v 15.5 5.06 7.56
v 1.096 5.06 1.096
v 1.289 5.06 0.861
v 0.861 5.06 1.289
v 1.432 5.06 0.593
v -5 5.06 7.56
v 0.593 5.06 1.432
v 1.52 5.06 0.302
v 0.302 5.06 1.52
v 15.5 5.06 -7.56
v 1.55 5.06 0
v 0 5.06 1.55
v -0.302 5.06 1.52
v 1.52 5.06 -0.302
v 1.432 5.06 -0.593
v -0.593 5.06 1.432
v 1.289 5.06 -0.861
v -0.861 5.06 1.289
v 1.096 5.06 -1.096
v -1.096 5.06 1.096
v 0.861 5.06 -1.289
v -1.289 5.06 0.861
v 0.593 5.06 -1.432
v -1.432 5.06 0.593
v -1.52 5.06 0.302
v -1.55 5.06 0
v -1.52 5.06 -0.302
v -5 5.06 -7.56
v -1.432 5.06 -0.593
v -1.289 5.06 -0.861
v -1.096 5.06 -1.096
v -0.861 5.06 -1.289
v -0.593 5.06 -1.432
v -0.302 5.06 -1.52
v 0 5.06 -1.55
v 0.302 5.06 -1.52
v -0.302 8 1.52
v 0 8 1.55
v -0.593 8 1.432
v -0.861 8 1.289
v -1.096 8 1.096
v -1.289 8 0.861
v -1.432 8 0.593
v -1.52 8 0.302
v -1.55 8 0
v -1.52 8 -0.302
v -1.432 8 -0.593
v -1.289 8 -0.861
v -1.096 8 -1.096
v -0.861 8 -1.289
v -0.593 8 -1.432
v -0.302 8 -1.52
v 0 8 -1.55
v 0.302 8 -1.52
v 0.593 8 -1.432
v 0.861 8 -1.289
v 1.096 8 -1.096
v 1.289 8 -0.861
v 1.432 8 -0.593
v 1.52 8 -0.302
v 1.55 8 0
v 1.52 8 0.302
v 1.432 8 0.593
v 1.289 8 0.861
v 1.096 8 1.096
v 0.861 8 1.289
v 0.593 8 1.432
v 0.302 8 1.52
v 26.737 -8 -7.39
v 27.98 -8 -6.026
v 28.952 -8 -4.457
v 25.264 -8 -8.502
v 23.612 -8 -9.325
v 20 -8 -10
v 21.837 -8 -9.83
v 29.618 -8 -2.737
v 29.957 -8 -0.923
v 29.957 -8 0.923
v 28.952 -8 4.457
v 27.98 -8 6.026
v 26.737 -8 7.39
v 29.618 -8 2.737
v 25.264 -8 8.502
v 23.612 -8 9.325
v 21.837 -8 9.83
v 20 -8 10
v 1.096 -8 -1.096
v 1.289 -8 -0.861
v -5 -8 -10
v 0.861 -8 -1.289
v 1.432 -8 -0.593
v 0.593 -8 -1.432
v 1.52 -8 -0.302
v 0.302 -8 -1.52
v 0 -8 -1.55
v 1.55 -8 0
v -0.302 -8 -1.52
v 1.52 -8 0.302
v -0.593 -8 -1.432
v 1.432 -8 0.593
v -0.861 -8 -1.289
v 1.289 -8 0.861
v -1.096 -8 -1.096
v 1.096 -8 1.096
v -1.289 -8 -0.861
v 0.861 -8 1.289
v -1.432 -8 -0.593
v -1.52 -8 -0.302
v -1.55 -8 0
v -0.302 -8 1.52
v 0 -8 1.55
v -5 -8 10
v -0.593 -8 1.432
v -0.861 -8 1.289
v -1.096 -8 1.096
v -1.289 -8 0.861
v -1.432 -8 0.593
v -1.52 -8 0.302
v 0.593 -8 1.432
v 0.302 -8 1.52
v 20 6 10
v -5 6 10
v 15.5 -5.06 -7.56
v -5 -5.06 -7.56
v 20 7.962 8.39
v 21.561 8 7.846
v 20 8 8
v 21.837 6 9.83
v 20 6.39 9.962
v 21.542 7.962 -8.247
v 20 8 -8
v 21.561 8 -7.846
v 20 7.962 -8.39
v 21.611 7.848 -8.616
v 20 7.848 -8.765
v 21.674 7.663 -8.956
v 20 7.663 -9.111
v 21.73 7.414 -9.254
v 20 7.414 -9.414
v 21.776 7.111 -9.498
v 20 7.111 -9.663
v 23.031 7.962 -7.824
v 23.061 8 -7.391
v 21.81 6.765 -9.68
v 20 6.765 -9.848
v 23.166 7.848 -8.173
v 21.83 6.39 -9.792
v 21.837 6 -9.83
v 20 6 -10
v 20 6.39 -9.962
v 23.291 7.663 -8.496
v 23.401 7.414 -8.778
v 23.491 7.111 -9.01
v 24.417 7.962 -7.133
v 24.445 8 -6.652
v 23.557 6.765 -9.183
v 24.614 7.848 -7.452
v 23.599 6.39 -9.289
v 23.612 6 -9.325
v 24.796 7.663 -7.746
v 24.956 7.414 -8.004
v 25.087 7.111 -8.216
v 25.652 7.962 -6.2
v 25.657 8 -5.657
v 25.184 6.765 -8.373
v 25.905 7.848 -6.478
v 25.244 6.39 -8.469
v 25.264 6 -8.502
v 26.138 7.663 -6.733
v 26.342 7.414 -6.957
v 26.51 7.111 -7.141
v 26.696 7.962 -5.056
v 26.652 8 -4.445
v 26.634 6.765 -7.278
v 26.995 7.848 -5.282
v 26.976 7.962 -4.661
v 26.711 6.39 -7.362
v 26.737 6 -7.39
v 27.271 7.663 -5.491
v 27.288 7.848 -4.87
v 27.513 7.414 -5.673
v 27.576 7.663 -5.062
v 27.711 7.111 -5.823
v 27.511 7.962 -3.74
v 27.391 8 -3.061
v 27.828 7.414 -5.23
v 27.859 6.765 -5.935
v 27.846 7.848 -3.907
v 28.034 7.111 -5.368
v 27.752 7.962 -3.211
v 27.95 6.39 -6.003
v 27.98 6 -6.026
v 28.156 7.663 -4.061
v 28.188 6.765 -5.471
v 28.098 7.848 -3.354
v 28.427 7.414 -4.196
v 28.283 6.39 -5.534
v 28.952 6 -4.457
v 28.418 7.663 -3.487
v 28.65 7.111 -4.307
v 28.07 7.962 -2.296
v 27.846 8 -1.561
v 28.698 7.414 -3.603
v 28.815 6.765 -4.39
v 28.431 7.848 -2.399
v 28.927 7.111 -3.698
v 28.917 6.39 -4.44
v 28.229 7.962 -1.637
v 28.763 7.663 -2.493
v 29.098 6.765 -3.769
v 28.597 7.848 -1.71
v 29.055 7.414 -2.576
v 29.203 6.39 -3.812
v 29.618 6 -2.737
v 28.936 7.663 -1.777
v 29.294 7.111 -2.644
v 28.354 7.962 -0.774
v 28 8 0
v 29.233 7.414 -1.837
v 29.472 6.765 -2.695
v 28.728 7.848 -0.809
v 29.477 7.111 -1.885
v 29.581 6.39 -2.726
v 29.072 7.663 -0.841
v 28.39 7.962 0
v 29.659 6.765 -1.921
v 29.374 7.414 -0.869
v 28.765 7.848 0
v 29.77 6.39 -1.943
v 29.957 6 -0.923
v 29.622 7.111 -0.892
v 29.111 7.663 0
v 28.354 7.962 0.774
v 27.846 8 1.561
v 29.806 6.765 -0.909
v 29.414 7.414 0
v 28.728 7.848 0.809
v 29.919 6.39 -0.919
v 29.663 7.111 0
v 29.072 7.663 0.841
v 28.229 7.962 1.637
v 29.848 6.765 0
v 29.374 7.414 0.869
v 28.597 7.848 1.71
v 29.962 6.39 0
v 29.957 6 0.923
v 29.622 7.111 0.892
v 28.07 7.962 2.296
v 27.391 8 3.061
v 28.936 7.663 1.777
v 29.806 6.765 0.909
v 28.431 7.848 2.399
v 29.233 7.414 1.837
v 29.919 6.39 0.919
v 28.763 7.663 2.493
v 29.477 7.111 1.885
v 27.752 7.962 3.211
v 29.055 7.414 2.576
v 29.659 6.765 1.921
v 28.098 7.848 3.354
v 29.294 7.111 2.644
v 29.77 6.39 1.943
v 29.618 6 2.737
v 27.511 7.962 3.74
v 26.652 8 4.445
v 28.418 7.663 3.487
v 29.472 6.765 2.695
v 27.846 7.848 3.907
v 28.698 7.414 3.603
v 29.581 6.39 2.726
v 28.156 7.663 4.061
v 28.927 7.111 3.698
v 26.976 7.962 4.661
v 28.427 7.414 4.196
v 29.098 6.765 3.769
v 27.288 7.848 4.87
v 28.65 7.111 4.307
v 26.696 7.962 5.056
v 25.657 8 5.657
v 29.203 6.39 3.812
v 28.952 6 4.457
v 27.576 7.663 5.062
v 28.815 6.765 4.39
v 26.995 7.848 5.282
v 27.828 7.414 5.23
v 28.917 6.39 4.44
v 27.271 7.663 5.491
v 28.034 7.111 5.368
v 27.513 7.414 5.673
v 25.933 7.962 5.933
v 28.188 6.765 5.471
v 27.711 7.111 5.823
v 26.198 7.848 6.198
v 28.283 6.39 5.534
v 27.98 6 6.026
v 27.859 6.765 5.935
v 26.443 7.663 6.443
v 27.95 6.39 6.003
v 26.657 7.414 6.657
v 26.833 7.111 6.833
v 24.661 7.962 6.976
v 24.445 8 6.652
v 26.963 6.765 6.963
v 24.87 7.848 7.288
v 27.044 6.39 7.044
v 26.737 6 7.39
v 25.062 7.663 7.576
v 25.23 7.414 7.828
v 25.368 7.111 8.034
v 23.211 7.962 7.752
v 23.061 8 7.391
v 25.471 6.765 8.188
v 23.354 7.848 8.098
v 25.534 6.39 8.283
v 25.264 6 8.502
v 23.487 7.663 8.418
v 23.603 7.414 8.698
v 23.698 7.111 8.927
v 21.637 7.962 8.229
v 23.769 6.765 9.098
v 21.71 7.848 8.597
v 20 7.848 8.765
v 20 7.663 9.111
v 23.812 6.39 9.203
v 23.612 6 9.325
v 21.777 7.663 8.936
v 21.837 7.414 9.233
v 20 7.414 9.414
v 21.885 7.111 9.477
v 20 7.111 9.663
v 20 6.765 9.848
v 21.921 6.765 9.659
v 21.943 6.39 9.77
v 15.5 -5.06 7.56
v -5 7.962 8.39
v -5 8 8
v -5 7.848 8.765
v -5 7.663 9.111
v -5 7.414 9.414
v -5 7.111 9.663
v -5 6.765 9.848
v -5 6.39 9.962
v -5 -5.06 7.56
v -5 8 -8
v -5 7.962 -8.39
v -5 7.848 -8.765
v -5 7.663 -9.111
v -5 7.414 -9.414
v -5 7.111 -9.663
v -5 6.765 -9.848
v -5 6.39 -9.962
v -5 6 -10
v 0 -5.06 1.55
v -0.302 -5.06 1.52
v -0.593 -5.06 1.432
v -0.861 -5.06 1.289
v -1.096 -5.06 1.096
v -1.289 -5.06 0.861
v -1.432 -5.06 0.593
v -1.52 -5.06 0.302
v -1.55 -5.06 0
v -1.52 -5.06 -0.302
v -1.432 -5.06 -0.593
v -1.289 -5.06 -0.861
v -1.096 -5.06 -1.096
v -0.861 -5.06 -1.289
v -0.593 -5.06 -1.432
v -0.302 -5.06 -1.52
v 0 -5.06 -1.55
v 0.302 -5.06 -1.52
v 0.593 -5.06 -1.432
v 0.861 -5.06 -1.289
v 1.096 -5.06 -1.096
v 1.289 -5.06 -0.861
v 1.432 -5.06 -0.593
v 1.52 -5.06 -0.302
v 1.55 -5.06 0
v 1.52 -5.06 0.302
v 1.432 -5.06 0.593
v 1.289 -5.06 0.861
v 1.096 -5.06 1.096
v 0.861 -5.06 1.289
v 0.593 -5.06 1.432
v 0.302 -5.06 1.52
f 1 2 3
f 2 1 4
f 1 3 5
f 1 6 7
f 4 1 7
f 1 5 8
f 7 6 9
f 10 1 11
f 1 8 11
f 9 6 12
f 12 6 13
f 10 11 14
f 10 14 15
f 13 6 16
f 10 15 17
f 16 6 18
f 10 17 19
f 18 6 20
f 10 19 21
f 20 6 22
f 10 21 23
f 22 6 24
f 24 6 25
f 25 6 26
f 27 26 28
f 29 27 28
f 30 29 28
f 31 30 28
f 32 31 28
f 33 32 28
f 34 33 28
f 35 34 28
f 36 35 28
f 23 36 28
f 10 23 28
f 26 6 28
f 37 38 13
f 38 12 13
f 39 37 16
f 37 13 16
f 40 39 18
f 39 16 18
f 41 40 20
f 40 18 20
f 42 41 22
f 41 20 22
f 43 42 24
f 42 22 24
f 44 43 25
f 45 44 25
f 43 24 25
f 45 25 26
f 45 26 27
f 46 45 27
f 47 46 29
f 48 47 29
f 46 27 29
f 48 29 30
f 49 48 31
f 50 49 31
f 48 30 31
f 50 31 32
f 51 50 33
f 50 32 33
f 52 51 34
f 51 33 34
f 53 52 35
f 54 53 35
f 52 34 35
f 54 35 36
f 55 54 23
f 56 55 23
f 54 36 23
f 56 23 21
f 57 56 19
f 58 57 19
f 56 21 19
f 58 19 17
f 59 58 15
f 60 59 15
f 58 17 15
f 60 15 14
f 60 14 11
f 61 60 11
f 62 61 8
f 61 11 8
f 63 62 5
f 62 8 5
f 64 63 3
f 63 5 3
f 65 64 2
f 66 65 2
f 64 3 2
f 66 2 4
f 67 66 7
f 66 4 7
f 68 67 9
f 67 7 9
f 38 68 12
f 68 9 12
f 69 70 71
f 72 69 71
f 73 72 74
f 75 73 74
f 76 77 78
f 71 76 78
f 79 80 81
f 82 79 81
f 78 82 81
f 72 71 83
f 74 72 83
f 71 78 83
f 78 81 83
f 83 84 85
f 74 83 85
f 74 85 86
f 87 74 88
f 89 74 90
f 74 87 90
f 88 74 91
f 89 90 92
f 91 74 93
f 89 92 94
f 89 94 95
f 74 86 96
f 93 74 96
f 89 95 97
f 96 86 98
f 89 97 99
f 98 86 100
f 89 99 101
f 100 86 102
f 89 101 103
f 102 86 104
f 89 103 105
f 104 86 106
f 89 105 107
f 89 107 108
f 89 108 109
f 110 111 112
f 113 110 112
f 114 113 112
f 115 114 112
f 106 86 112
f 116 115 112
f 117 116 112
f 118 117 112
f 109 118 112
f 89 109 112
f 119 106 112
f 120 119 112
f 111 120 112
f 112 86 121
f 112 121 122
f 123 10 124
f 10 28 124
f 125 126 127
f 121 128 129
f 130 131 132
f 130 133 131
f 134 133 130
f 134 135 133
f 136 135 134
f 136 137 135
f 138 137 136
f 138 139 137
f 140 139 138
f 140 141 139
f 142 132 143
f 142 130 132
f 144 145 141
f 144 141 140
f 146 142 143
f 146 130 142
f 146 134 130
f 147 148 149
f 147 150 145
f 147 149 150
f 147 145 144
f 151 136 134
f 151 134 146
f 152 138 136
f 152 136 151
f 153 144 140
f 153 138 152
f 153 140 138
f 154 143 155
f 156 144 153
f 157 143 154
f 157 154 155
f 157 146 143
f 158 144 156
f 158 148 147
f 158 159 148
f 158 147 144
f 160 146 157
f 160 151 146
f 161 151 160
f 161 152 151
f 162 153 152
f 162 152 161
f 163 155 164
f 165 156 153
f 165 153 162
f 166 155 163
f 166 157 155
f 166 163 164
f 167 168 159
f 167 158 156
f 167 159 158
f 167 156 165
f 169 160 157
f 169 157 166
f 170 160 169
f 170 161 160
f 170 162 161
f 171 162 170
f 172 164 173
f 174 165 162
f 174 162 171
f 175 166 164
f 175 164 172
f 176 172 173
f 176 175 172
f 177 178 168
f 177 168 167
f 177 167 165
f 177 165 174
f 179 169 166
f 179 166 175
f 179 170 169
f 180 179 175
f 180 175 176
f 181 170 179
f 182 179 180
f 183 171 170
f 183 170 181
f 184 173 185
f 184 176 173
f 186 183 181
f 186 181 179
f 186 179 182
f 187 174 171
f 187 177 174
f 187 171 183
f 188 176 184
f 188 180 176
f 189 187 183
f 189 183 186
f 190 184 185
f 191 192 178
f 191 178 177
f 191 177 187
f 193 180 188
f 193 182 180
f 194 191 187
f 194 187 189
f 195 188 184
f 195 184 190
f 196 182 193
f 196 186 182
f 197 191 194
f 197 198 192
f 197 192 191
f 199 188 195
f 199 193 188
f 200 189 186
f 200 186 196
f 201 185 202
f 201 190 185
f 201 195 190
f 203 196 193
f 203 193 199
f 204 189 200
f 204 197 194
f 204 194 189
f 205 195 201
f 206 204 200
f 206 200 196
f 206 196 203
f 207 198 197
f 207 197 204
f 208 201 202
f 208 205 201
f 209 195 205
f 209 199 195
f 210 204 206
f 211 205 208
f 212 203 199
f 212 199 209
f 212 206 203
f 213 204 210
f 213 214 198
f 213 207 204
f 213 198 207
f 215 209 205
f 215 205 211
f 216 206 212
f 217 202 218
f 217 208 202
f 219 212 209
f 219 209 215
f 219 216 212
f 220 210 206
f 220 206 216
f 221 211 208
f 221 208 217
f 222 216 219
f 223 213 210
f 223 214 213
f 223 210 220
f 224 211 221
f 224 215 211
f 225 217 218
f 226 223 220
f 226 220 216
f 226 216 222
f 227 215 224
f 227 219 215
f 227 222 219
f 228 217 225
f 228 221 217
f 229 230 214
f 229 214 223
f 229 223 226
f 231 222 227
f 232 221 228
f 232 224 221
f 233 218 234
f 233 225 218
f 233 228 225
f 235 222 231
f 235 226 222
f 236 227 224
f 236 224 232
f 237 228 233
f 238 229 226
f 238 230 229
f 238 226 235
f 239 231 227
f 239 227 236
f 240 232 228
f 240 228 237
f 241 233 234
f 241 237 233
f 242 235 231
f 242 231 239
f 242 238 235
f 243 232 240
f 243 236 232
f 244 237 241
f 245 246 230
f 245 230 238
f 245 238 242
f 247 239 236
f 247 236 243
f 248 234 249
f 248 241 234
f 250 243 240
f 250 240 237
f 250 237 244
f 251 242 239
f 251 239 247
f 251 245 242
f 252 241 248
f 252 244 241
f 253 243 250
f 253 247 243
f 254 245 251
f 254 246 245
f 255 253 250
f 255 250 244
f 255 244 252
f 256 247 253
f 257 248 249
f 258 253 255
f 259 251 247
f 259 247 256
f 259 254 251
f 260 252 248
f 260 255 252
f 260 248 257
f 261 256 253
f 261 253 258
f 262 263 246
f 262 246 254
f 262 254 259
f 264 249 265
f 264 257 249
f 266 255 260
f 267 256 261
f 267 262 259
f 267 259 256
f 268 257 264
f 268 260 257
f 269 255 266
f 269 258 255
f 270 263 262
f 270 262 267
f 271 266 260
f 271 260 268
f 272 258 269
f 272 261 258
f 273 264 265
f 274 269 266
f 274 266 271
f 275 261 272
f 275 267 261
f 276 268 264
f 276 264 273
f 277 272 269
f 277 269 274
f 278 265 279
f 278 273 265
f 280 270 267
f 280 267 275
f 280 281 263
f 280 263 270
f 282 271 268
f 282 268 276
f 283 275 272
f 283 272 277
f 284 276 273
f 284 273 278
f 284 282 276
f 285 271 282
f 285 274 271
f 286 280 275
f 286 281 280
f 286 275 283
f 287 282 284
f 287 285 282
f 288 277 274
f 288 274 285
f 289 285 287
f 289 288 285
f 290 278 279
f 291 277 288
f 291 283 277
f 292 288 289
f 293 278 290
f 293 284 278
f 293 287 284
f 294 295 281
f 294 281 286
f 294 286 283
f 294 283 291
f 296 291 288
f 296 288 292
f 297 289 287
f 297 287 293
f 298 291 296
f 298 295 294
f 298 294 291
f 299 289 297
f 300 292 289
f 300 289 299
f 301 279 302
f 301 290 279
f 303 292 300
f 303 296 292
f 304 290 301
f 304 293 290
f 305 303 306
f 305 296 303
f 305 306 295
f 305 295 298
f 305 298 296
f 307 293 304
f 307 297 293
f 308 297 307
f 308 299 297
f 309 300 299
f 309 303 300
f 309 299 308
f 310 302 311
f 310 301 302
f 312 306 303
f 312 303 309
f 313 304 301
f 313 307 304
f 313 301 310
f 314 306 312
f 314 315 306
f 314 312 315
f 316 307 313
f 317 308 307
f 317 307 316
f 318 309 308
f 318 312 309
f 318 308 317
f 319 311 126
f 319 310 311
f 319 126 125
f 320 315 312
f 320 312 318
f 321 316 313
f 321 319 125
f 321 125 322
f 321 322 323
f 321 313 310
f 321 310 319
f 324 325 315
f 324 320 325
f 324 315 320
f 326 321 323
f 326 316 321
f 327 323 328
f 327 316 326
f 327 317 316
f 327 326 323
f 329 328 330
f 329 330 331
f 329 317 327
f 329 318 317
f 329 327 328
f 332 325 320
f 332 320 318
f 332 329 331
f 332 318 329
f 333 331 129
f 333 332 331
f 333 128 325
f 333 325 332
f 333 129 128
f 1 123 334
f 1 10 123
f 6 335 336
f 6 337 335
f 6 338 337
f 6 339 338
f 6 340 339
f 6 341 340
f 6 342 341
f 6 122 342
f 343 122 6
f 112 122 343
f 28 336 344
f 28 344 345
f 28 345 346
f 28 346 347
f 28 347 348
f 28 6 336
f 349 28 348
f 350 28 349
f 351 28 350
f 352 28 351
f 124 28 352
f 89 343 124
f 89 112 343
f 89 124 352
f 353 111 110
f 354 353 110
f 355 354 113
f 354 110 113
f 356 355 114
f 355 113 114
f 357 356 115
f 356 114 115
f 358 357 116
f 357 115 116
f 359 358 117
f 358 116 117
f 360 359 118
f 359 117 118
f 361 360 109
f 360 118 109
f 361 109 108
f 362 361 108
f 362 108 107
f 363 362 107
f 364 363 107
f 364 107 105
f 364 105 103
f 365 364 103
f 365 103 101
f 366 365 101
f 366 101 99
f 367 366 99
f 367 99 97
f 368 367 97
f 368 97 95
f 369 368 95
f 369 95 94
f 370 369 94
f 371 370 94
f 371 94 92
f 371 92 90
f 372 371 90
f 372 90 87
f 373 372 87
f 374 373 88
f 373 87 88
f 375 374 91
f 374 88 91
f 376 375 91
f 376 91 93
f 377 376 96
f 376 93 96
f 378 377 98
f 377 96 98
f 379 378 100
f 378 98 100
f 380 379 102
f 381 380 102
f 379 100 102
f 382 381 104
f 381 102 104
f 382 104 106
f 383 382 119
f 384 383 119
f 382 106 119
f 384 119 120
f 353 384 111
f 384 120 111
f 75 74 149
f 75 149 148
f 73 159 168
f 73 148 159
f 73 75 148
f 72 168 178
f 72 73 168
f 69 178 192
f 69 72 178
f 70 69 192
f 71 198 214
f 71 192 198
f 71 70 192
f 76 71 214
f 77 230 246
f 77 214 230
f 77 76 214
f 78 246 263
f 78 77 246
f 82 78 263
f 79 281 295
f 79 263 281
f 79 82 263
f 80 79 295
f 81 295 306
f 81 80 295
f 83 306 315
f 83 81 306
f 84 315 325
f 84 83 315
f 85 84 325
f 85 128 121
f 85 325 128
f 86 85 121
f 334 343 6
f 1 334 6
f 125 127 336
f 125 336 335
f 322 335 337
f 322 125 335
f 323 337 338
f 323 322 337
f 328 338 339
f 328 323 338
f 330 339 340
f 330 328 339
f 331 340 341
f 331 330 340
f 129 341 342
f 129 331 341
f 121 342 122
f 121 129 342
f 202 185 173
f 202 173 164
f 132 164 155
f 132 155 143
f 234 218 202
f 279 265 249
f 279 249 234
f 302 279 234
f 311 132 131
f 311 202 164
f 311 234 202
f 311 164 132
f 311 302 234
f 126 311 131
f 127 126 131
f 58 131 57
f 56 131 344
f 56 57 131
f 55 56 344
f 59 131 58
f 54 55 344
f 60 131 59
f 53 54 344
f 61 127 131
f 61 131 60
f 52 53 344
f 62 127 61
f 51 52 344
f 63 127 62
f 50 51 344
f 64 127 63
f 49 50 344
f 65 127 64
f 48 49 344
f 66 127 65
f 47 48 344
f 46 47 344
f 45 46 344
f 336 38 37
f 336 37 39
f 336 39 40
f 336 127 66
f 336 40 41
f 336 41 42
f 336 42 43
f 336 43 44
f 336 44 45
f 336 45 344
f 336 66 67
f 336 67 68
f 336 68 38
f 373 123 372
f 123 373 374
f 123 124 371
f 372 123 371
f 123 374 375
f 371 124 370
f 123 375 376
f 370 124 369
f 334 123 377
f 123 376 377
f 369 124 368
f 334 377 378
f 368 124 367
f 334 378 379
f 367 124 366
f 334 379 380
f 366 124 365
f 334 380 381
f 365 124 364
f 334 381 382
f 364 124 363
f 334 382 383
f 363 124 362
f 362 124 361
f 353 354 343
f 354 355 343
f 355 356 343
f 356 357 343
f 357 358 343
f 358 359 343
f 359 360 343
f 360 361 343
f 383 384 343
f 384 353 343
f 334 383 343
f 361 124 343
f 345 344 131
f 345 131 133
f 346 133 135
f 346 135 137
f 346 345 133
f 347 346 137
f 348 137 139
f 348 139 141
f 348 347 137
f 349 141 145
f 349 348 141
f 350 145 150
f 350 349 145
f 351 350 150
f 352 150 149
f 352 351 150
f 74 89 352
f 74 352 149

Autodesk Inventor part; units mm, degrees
ref_plane "YZ Plane" through (0, 0, 0) normal (1, 0, 0) x (0, 1, 0)
ref_plane "XZ Plane" through (0, 0, 0) normal (0, 1, 0) x (-1, 0, 0)
ref_plane "XY Plane" through (0, 0, 0) normal (0, 0, 1) x (1, 0, 0)
sketch "Sketch1" plane through (0, 0, 0) normal (0, 1, 0) x (-1, 0, 0)
  line L0 (5, -10) -> (-20, -10)
  line L1 (-20, -10) -> (-20, 10)
  line L2 (-20, 10) -> (5, 10)
  line L3 (5, 10) -> (5, -10)
  line L4 (5, -10) -> (-20, 10) construction
  line L5 (-20, -10) -> (5, 10) construction
  circle A0 centre (-20, 0) radius 10
  point P0 (0, 0)
  point P1 (-7.5, 0)
  point P2 (-20, 10)
  dimension "d0" = 20
  dimension "d1" = 20
  dimension "d2" = 5
extrude "Extrusion1" add sketch "Sketch1" along normal mid plane 16
sketch "Sketch2" plane through (0, 8, 0) normal (0, 1, 0) x (1, 0, 0)
  point P0 (0, 0)
  point P1 (0, 0)
hole "Hole1" at (0, 8, 0) direction (0, -1, 0) diameter 3.1 end through all
sketch "Sketch3" plane through (-5, -8, 10) normal (-1, 0, 0) x (0, 0, 1)
  line L0 (-17.56, 2.94) -> (-2.44, 2.94)
  line L1 (-2.44, 2.94) -> (-2.44, 13.06)
  line L2 (-2.44, 13.06) -> (-17.56, 13.06)
  line L3 (-17.56, 13.06) -> (-17.56, 2.94)
  line L4 (-17.56, 2.94) -> (-2.44, 13.06) construction
  line L5 (-2.44, 2.94) -> (-17.56, 13.06) construction
  point P0 (-10, 8)
  dimension "d12" = 15.12
  dimension "d13" = 10.12
extrude "Extrusion2" cut sketch "Sketch3" against normal blind 20.5
fillet "Fillet1" radius 2 3 edges at (30, 8, 0) (7.5, 8, -10) (7.5, 8, 10)
properties part number "T-Frame Right Cover" material "ABS Plastic"
